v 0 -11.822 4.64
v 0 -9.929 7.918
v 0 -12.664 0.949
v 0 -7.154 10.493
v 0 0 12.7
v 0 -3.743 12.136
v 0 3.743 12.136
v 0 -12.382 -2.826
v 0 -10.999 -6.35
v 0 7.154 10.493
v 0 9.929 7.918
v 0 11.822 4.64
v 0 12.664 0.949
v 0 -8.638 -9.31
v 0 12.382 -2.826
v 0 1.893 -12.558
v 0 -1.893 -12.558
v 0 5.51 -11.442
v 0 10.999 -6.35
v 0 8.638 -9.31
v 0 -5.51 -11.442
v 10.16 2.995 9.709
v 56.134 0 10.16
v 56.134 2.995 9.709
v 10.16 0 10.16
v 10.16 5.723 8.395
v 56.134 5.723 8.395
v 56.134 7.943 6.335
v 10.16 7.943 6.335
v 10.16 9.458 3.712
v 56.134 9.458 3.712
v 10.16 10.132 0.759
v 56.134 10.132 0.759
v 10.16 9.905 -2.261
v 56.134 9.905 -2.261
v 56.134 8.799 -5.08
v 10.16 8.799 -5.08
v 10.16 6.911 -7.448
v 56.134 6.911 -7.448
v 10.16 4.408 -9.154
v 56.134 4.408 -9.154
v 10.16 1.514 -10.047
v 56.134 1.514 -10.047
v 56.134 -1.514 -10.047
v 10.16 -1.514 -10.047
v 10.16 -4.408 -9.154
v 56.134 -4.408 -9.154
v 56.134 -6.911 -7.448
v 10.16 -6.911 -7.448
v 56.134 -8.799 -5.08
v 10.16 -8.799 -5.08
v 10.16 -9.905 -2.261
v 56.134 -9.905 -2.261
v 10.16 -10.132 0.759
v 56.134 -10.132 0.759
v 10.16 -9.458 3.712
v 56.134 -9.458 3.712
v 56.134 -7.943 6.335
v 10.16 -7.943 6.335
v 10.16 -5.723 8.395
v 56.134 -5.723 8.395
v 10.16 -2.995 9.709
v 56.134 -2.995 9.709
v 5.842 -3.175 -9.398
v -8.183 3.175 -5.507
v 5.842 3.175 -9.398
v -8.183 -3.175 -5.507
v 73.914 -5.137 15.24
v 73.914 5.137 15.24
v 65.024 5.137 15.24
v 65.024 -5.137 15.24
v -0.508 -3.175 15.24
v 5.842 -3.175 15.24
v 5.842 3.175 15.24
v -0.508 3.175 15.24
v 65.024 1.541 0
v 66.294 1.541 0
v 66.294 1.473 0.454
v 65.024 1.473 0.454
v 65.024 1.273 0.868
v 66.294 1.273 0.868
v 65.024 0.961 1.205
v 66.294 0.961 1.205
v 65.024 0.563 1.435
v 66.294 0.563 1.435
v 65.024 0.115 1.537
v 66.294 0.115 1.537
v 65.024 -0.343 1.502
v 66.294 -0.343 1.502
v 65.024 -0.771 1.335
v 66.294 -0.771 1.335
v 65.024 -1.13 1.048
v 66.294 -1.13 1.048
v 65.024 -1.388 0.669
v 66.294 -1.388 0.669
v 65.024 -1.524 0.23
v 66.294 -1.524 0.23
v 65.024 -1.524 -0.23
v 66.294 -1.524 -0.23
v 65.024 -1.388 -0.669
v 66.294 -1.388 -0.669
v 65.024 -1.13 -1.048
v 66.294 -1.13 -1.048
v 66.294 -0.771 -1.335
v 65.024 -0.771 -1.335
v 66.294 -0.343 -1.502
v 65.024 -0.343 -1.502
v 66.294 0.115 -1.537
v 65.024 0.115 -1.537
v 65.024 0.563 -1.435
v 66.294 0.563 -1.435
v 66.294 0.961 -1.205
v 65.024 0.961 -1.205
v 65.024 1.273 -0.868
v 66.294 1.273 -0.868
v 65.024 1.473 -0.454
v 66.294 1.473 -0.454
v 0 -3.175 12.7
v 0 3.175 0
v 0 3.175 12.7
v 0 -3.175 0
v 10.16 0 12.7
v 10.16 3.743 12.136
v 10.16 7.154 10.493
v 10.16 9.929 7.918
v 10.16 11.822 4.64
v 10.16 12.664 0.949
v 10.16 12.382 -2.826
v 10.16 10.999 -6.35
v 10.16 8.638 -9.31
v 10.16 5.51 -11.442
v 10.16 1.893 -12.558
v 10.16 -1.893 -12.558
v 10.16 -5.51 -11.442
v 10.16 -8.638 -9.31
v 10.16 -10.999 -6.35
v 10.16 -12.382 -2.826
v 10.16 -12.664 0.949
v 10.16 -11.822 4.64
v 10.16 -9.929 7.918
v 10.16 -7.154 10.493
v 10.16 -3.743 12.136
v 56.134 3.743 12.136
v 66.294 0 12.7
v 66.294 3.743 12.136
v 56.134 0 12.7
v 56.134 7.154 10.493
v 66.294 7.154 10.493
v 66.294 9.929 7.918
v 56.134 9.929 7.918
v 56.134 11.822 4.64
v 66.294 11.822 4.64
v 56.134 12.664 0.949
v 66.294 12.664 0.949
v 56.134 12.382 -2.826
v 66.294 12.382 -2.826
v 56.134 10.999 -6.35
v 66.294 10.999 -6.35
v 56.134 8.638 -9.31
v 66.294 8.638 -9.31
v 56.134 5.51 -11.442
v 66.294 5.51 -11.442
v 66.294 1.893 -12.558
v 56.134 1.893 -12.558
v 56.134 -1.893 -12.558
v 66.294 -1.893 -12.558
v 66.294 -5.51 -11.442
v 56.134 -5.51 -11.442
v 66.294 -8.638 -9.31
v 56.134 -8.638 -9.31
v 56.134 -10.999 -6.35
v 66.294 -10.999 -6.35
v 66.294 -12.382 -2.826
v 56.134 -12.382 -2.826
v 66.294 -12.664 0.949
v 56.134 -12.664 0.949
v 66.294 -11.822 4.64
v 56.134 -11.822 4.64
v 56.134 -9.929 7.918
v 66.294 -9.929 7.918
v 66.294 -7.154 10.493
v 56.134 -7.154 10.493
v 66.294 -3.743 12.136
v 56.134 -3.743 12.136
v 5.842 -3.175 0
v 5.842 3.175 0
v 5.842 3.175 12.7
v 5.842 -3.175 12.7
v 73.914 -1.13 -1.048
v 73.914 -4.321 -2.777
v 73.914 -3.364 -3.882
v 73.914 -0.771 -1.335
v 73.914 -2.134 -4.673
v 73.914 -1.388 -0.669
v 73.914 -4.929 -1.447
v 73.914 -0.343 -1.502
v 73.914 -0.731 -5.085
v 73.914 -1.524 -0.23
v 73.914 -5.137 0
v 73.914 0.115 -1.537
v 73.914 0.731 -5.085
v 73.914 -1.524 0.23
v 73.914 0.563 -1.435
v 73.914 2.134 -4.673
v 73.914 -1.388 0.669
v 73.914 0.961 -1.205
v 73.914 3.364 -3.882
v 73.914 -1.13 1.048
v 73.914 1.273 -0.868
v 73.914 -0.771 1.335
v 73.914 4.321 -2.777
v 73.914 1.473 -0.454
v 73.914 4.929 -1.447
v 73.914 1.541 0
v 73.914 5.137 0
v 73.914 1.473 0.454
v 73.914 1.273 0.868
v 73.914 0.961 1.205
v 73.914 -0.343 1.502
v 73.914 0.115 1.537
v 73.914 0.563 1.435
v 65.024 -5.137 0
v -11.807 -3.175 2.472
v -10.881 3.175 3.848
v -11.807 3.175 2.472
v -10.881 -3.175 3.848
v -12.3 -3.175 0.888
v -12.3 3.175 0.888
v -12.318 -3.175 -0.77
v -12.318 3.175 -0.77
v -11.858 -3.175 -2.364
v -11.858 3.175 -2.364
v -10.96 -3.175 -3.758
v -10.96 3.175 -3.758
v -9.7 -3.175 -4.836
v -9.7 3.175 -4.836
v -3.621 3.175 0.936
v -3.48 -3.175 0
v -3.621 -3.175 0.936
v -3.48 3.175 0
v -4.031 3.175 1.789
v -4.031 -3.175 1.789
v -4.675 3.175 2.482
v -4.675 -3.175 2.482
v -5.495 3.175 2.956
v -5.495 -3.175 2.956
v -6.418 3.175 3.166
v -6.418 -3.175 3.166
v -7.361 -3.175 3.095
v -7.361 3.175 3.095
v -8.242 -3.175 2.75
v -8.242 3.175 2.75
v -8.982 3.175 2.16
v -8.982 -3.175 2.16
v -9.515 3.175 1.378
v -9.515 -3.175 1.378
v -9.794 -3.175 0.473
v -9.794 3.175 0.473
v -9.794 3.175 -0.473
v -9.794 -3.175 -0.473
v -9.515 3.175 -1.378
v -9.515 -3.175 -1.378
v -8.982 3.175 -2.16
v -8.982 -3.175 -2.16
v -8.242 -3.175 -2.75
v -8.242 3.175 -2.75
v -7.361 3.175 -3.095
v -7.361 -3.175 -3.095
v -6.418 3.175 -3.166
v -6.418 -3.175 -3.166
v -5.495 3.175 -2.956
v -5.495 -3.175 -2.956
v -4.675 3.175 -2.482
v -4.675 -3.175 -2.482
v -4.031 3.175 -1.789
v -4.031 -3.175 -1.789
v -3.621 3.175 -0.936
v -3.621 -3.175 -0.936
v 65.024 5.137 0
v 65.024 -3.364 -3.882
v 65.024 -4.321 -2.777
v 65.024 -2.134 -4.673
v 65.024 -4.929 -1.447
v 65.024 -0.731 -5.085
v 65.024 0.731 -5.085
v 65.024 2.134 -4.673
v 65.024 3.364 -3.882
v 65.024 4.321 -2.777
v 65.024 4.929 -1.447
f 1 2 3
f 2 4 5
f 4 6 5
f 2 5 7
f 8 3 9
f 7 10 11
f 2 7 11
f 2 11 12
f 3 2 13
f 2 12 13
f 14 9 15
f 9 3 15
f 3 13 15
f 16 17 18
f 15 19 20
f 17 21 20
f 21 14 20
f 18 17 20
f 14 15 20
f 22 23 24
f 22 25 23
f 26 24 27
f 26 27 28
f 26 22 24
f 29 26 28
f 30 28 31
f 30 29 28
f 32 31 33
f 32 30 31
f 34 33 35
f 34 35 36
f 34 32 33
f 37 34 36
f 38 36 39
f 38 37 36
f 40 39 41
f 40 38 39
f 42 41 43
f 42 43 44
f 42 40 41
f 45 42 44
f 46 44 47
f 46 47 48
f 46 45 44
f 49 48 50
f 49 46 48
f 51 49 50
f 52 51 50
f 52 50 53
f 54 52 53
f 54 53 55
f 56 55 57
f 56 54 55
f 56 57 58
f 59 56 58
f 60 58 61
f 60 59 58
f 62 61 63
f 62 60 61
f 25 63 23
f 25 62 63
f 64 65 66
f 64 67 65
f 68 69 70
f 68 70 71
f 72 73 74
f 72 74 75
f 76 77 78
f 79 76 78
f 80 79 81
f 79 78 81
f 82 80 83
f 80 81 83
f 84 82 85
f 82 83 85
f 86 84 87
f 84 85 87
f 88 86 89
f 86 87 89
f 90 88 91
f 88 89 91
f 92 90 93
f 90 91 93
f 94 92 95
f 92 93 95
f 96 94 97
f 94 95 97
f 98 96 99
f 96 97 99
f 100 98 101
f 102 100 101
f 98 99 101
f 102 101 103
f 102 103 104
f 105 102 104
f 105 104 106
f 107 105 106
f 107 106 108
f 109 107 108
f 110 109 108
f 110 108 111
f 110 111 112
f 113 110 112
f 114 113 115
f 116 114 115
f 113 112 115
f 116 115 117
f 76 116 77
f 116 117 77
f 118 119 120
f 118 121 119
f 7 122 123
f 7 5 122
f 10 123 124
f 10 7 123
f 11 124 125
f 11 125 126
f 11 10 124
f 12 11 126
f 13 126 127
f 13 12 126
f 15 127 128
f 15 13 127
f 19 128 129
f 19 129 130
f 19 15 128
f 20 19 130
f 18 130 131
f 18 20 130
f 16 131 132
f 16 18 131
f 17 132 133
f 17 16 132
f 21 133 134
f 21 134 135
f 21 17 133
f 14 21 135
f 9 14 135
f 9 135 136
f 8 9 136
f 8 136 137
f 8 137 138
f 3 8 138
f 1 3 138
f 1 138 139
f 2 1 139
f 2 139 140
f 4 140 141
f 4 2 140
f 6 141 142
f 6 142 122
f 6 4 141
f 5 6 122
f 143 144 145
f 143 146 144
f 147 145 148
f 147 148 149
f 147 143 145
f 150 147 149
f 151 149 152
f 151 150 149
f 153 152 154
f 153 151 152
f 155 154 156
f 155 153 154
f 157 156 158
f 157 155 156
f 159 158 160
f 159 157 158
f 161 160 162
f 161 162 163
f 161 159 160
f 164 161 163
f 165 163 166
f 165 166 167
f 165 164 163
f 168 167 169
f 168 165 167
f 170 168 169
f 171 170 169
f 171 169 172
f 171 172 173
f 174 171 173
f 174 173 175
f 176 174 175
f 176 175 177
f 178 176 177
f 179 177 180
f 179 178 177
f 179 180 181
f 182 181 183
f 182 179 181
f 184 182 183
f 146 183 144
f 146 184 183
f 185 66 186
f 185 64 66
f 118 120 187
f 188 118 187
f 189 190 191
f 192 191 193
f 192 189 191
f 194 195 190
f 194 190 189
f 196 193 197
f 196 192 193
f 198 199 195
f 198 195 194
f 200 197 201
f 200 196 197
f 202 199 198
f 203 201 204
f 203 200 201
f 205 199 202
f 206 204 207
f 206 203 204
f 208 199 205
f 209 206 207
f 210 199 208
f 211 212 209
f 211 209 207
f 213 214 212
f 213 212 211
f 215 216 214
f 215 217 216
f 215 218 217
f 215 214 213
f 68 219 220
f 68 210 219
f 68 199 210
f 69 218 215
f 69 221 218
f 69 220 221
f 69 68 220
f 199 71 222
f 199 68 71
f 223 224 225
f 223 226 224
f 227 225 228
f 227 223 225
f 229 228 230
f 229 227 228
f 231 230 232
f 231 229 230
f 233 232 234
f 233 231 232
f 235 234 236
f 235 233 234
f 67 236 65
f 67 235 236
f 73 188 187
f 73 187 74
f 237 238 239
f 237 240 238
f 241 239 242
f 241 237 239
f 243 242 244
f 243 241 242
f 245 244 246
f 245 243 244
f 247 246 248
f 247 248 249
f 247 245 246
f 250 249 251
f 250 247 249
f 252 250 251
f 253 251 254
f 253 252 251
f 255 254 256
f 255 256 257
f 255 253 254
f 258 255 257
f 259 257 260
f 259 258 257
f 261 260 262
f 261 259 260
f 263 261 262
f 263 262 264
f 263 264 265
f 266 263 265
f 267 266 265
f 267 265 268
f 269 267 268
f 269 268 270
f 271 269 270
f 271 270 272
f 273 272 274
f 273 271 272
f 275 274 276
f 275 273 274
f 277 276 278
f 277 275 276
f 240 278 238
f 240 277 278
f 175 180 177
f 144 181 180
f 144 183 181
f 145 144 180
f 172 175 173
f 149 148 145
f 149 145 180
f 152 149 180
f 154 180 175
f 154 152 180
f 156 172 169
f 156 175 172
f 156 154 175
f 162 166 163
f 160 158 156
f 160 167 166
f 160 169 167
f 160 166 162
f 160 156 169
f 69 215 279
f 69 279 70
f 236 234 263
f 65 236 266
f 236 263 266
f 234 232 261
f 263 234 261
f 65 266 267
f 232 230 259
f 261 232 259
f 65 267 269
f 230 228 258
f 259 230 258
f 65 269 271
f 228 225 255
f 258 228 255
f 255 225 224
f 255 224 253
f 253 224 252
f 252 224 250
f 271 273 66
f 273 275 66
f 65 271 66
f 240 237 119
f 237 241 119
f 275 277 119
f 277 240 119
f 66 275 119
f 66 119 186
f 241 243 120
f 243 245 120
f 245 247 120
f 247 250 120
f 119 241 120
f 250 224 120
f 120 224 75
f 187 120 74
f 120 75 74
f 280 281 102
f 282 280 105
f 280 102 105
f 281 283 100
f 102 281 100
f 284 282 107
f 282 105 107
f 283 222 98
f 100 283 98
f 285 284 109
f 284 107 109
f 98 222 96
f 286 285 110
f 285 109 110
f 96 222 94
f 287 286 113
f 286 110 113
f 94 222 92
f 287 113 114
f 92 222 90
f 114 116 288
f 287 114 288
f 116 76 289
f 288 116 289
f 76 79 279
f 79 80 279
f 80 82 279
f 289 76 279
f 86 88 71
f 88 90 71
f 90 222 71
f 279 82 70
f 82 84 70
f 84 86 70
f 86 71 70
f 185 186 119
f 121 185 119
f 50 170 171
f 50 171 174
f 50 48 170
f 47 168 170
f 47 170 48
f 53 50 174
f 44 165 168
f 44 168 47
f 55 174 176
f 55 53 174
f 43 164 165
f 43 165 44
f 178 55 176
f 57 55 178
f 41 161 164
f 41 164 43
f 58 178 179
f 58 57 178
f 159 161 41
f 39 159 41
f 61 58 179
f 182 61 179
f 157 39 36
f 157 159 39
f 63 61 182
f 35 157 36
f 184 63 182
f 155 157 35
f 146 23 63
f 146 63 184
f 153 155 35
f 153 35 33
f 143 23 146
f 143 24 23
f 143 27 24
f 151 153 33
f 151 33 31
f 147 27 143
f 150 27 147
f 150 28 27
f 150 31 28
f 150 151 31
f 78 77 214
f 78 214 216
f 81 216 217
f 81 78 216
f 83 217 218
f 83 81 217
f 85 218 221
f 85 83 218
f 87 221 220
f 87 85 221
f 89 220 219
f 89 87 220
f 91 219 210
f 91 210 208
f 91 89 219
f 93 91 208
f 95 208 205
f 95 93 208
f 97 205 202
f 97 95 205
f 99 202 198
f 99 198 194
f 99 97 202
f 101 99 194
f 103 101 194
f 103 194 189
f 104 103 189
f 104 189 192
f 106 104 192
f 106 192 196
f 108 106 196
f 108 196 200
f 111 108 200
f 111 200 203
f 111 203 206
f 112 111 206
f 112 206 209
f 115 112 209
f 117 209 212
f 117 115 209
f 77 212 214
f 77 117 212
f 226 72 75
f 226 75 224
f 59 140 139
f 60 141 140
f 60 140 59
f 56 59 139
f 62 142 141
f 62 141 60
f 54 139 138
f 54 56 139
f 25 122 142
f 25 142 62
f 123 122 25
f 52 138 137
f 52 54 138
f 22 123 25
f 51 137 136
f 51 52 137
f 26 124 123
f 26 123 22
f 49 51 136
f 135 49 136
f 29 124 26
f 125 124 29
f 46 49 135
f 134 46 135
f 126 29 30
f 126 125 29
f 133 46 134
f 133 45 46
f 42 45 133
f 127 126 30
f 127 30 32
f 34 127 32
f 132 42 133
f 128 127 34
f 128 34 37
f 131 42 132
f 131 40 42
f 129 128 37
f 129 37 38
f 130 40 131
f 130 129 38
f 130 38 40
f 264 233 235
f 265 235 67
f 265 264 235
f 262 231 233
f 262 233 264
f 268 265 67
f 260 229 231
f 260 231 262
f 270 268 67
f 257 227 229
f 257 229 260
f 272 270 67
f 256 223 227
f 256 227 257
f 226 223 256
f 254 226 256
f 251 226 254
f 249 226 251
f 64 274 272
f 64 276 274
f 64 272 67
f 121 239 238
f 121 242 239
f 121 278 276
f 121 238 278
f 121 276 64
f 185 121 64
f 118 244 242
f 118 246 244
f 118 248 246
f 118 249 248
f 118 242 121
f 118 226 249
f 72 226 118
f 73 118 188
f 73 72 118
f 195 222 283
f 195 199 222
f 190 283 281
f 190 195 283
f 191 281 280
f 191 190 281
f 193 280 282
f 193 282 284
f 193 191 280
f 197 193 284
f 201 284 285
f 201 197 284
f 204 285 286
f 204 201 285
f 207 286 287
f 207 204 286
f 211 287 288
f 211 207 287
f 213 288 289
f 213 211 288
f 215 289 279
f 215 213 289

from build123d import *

# Parameters (mm, degrees)
F0_W          = 5.842
F0_H          = 12.7
F0_R          = 3.175
F2_DEPTH      = 3.175
F3_R          = 1.541072
F4_DEPTH      = 7.62
F4_DEPTH_BACK = 1.27


with BuildPart() as f1:
    # F0 (on Front) → F1 (revolve)
    with BuildSketch(Plane.XZ):
        Polygon((5.842, 12.7), (5.842, 0), (66.294, 0), (66.294, 12.7), (56.134, 12.7), (56.134, 10.16), (10.16, 10.16), (10.16, 12.7), align=None)
        with Locations((2.921, 6.35)):
            Rectangle(F0_W, F0_H)
    revolve(axis=Axis((33.147, 0, 0), (-1, 0, 0)))


with BuildPart() as f2:
    # F0 (on Front) → F2 (new body, symmetric)
    with BuildSketch(Plane.XZ):
        with BuildLine():
            Line((-0.9398, 0), (0, 0))
            Line((0, 0), (0, 12.7))
            Line((0, 12.7), (5.842, 12.7))
            Line((5.842, 12.7), (5.842, 15.24))
            Line((5.842, 15.24), (-0.508, 15.24))
            Line((-0.508, 15.24), (-10.88063, 3.847543))
            ThreePointArc((-10.88063, 3.847543), (-4.591961, 5.329721), (-0.9398, 0))
        make_face()
        with BuildLine():
            Line((5.842, 0), (0, 0))
            Line((0, 0), (-0.9398, 0))
            ThreePointArc((-0.9398, 0), (-3.195791, -4.549339), (-8.182663, -5.506983))
            Line((-8.182663, -5.506983), (5.842, -9.398))
            Line((5.842, -9.398), (5.842, 0))
        make_face()
        with BuildLine():
            ThreePointArc((-8.182663, -5.506983), (-3.195791, -4.549339), (-0.9398, 0))
            ThreePointArc((-0.9398, 0), (-4.591961, 5.329721), (-10.88063, 3.847543))
            ThreePointArc((-10.88063, 3.847543), (-12.145978, -1.583727), (-8.182663, -5.506983))
        make_face()
        with Locations((-6.6548, 0)):
            Circle(F0_R, mode=Mode.SUBTRACT)
    extrude(amount=F2_DEPTH, both=True)


with BuildPart() as f4:
    # F3 (on face) → F4 (new body, two sides)
    with BuildSketch(Plane.YZ.offset(66.294)) as f4_sk:
        with BuildLine():
            ThreePointArc((-5.136908, 0), (0, -5.136908), (5.136908, 0))
            ThreePointArc((5.136908, 0), (0, 5.136908), (-5.136908, 0))
        make_face()
        Circle(F3_R, mode=Mode.SUBTRACT)
        with BuildLine():
            ThreePointArc((-5.136908, 0), (0, 5.136908), (5.136908, 0))
            Line((5.136908, 0), (5.136908, 15.24))
            Line((5.136908, 15.24), (-5.136908, 15.24))
            Line((-5.136908, 15.24), (-5.136908, 0))
        make_face()
    extrude(amount=F4_DEPTH)
    extrude(f4_sk.sketch, amount=-F4_DEPTH_BACK)


solid = Compound([f1.part, f2.part, f4.part])
